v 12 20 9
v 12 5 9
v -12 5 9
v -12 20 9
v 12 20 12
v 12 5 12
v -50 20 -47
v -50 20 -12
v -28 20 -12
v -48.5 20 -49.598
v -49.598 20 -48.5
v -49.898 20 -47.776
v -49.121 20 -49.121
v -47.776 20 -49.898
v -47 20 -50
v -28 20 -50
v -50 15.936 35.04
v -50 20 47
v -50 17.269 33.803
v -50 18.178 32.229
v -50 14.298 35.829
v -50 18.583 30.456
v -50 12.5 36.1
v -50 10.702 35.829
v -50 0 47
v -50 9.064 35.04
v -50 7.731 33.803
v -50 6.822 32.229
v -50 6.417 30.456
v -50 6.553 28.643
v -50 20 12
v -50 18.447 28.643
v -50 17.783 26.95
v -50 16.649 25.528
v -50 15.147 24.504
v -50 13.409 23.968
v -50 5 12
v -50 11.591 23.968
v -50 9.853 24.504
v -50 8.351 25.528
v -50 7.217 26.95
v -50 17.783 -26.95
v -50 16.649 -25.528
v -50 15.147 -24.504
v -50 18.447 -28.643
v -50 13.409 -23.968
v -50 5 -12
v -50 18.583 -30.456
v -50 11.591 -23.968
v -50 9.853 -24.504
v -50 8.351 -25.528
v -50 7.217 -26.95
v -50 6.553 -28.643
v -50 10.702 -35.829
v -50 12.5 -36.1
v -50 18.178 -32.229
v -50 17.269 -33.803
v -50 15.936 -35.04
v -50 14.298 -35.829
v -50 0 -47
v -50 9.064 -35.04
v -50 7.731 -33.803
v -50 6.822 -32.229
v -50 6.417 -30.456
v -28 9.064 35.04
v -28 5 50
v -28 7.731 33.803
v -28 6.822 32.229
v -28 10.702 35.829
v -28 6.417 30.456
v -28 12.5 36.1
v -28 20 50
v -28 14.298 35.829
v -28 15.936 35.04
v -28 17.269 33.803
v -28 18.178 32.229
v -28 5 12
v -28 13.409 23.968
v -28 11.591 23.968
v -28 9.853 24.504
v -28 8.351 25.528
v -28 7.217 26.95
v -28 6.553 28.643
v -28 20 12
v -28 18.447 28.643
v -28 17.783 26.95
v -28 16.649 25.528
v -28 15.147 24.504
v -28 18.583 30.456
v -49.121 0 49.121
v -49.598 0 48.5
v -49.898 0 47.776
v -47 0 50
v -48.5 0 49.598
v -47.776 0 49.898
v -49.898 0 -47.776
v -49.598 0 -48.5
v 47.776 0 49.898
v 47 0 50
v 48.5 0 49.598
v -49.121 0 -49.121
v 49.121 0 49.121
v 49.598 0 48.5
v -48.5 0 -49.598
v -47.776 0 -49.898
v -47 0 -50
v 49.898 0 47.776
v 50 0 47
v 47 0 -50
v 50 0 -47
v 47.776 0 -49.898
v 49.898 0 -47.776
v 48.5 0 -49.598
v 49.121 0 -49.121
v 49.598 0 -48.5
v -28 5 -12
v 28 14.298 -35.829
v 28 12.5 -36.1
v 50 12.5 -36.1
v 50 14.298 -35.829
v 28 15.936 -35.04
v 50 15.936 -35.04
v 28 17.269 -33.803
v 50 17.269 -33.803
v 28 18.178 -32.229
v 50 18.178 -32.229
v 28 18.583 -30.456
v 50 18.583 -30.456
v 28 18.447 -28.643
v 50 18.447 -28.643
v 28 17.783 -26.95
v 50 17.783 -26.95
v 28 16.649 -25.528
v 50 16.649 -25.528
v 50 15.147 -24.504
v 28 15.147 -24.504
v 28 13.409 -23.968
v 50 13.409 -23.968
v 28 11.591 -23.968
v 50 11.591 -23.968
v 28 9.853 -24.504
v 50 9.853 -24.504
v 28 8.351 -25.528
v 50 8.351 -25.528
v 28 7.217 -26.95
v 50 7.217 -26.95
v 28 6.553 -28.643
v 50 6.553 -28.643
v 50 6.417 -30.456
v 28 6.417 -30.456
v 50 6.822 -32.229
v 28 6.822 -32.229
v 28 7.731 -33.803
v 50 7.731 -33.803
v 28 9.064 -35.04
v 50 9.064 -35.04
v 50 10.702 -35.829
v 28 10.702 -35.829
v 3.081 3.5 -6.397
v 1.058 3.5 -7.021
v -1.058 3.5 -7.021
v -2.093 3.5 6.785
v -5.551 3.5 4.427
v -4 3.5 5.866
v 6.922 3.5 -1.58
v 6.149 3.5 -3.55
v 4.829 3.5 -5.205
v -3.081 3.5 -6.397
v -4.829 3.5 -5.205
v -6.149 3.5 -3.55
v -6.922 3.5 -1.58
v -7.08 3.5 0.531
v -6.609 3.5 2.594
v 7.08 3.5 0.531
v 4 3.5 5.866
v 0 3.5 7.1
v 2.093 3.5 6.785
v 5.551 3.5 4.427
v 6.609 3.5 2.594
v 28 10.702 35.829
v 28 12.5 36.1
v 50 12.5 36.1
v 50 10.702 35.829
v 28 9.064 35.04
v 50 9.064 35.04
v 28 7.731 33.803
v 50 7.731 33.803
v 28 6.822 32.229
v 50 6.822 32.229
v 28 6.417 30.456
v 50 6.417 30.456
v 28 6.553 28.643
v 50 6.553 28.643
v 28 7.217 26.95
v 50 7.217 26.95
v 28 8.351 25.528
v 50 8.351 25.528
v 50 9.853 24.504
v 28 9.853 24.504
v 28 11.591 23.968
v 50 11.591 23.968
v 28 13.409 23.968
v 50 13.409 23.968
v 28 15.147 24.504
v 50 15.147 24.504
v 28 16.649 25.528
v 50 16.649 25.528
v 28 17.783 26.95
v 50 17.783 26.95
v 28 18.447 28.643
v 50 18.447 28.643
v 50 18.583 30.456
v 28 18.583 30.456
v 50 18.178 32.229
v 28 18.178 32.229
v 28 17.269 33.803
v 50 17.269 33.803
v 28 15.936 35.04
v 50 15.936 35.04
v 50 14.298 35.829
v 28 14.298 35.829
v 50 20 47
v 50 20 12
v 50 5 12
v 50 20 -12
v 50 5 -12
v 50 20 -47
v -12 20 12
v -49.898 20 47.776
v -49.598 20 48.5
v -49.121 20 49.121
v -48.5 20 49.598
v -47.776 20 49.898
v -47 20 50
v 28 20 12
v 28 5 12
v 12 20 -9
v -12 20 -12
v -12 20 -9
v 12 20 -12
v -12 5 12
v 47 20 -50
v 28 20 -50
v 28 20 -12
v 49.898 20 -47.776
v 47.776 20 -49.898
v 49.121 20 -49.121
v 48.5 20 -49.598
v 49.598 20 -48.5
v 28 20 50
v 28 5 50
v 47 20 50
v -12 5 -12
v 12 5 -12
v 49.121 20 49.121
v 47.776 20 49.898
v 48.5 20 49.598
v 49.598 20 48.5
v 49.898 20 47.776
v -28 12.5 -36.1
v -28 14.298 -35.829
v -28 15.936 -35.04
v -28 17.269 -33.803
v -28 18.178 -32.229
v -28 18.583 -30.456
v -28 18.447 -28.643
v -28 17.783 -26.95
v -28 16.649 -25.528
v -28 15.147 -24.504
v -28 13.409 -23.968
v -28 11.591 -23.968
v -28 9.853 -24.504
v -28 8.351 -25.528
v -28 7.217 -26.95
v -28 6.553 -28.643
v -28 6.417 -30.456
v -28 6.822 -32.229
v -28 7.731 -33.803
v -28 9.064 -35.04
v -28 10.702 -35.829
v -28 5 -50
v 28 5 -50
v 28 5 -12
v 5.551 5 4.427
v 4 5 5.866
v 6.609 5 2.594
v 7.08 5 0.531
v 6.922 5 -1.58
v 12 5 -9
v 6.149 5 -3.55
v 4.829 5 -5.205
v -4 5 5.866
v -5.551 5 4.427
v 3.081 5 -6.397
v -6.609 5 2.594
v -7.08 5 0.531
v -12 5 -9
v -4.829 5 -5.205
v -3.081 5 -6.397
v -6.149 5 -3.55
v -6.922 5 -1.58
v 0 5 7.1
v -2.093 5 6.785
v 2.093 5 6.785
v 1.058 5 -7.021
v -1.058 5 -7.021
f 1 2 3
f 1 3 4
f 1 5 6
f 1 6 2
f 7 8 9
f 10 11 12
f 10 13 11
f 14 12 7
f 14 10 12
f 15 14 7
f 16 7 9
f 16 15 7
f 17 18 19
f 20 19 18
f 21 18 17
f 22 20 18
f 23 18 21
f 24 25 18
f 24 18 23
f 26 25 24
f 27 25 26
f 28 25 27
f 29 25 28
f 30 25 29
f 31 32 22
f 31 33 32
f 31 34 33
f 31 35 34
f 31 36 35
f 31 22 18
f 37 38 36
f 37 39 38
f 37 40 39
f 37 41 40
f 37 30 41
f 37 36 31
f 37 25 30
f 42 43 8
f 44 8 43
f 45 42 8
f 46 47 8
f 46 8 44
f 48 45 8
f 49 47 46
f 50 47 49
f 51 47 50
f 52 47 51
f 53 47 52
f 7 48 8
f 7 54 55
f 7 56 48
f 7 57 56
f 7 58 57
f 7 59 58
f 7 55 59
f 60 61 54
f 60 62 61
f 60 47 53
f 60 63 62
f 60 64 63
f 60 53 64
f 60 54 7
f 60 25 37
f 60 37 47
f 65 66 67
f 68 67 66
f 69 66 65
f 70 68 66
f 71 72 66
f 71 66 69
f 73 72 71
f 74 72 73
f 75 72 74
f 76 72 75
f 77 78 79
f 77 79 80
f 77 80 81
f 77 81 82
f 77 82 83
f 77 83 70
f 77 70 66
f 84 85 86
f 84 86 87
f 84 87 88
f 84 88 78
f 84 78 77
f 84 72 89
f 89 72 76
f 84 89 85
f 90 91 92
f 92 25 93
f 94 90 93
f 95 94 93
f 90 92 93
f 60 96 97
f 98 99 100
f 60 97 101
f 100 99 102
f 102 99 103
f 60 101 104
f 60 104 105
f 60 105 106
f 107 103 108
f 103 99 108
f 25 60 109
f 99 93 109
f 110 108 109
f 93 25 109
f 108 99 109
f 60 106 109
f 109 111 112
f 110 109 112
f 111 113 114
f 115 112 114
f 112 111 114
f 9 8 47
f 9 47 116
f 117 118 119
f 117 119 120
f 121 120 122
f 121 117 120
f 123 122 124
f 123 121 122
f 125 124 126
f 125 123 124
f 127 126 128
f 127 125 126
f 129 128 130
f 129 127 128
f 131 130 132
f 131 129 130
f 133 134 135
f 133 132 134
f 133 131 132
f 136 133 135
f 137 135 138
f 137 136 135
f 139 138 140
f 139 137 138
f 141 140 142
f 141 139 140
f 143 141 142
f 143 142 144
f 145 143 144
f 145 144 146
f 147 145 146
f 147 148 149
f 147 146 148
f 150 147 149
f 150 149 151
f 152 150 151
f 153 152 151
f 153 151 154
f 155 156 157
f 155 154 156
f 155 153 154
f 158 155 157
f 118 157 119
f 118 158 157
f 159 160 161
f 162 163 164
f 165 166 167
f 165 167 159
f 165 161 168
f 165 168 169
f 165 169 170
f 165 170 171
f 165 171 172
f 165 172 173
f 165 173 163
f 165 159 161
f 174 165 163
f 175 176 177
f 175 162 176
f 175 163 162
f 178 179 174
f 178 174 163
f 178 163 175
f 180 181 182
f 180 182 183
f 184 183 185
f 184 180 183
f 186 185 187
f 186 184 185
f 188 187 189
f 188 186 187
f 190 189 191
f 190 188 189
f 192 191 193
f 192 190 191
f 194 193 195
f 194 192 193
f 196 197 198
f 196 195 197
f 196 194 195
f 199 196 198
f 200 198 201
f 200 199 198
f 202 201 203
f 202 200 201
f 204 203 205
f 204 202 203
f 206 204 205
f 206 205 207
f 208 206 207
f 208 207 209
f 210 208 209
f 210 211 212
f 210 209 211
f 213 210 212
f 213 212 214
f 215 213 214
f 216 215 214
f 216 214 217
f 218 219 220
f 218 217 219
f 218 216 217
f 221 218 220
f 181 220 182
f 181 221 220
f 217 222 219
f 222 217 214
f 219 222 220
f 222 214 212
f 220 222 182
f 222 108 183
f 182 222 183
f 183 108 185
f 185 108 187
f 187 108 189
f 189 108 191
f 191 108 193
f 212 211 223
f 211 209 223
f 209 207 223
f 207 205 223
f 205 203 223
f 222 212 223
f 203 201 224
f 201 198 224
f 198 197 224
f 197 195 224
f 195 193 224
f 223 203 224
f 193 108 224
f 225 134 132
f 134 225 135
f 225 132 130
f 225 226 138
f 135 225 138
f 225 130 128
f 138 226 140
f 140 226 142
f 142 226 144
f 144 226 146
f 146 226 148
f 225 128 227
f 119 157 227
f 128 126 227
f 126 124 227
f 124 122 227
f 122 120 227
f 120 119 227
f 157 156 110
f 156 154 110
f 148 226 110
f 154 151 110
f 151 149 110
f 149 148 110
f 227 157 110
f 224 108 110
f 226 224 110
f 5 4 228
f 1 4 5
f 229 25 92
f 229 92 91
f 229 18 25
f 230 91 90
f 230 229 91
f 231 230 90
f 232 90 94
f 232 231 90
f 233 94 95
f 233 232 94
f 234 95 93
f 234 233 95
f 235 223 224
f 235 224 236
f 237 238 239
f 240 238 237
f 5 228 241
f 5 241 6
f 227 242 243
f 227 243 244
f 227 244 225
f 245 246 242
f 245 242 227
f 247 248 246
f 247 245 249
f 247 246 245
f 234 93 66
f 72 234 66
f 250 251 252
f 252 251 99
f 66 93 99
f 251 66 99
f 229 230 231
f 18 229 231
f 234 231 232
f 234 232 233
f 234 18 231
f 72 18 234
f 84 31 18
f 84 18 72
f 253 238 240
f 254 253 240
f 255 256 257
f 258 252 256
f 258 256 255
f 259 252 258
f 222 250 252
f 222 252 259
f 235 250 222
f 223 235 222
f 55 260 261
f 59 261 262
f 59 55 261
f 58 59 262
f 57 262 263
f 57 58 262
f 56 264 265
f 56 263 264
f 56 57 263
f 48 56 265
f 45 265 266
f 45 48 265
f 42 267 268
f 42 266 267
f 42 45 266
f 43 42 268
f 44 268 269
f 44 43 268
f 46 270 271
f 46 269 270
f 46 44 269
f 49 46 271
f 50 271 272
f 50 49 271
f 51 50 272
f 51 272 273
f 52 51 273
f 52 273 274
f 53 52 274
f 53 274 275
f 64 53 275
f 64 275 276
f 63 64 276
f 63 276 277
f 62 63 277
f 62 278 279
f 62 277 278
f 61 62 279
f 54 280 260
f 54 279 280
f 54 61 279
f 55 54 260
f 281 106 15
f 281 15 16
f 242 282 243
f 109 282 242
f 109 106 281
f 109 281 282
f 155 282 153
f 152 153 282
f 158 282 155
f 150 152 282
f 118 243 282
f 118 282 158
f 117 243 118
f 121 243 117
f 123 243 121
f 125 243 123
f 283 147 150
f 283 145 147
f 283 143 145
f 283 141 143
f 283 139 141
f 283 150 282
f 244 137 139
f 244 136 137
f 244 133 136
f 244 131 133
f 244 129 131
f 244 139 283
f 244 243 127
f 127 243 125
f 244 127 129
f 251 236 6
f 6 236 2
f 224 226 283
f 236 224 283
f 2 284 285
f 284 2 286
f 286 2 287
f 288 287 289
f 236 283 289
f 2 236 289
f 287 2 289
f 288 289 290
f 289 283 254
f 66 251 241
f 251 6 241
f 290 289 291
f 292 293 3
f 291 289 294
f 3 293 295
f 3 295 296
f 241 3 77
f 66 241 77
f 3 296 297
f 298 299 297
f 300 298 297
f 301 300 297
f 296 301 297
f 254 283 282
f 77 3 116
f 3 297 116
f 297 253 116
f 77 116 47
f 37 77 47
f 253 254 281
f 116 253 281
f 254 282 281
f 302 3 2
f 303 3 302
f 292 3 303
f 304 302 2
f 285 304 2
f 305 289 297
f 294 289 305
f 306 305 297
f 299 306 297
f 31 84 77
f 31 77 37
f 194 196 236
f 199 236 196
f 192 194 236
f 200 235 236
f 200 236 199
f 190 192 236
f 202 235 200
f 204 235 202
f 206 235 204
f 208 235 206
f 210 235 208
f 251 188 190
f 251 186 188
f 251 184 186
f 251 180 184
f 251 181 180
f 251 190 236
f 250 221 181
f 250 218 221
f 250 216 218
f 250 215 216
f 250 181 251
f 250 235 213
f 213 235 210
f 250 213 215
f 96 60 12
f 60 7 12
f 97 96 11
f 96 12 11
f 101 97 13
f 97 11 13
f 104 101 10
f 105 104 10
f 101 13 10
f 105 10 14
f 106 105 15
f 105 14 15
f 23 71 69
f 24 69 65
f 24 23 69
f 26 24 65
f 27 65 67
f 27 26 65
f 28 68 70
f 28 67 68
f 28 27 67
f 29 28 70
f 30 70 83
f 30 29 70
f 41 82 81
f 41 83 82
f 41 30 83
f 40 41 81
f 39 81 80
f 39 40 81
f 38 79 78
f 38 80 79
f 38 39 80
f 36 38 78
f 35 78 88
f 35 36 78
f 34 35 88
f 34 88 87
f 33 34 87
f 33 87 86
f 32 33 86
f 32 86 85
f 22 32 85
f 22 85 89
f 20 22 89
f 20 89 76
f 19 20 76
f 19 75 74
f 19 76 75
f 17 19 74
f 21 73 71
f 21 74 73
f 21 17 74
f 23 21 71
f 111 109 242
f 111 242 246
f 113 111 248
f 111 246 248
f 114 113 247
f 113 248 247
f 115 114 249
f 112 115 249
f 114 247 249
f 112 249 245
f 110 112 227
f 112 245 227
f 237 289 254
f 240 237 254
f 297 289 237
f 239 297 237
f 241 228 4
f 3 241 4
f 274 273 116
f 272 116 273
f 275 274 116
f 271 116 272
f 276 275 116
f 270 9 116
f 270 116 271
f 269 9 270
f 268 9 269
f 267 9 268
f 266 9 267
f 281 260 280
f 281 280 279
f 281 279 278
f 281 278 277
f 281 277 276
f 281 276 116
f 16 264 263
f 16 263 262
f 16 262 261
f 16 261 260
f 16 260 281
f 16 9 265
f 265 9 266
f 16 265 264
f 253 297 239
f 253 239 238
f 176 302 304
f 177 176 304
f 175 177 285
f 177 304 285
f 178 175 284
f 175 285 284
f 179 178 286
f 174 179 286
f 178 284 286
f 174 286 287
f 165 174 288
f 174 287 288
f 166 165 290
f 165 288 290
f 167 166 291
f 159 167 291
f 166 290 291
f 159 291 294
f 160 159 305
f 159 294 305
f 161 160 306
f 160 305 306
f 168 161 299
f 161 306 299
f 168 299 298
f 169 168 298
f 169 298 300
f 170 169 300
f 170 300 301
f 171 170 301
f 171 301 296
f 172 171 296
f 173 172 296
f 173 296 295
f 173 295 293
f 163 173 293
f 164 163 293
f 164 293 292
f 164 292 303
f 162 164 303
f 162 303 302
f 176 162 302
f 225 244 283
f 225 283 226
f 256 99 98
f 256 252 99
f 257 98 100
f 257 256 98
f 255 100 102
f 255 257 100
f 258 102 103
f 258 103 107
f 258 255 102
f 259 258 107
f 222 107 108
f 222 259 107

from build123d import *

# Parameters (mm, degrees)
SKETCH1_W               = 100
SKETCH1_H               = 100
BOSS_EXTRUDE1_DEPTH     = 20
SKETCH3_R               = 7.1
CUT_EXTRUDE1_DEPTH      = 16.5
CUT_EXTRUDE4_DEPTH      = 74.484692283
CUT_EXTRUDE4_DEPTH_BACK = 74.484692283
SKETCH7_R               = 6.1
FILLET1_R               = 3
SKETCH11_W              = 24
SKETCH11_H              = 24
CUT_EXTRUDE6_DEPTH      = 15
SKETCH12_W              = 18
SKETCH12_H              = 15
CUT_EXTRUDE7_DEPTH      = 32


with BuildPart() as part:
    # Sketch1 → Boss-Extrude1 (new body)
    with BuildSketch(Plane(origin=(0, 0, 0), x_dir=(1, 0, 0), z_dir=(0, 1, 0))):
        Rectangle(SKETCH1_W, SKETCH1_H)
    extrude(amount=BOSS_EXTRUDE1_DEPTH)

    # Sketch3 → Cut-Extrude1 (cut)
    with BuildSketch(Plane(origin=(0, 20, 0), x_dir=(1, 0, 0), z_dir=(0, 1, 0))):
        with Locations(Location((0, 0, 0), (0, 0, 270))):
            Circle(SKETCH3_R)
    extrude(amount=-CUT_EXTRUDE1_DEPTH, mode=Mode.SUBTRACT)

    # Sketch7 → Cut-Extrude4 (cut, two sides: drawn at the far end of the back side and taken through both)
    with BuildSketch(Plane(origin=(0, 0, 0), x_dir=(0, 0, -1), z_dir=(1, 0, 0)).offset(-CUT_EXTRUDE4_DEPTH_BACK)):
        with Locations((30, 12.5)):
            Circle(SKETCH7_R)
        with Locations(Location((-30, 12.5, 0), (0, 0, 180))):
            Circle(SKETCH7_R)
    extrude(amount=CUT_EXTRUDE4_DEPTH + CUT_EXTRUDE4_DEPTH_BACK, mode=Mode.SUBTRACT)

    # Fillet1
    fillet1_edges = [part.edges().sort_by_distance(p)[0] for p in [
        (50, 10, 50),
        (-50, 10, 50),
        (-50, 10, -50),
        (50, 10, -50),
    ]]
    fillet(fillet1_edges, radius=FILLET1_R)

    # Sketch11 → Cut-Extrude6 (cut)
    with BuildSketch(Plane(origin=(0, 20, 0), x_dir=(1, 0, 0), z_dir=(0, 1, 0))):
        Polygon((-50, 12), (-28, 12), (-28, 50), (28, 50), (28, 12), (50, 12), (50, -12), (28, -12), (28, -50), (-28, -50), (-28, -12), (-50, -12), align=None)
        Rectangle(SKETCH11_W, SKETCH11_H, mode=Mode.SUBTRACT)
    extrude(amount=-CUT_EXTRUDE6_DEPTH, mode=Mode.SUBTRACT)

    # Sketch12 → Cut-Extrude7 (cut)
    with BuildSketch(Plane(origin=(12, 0, 0), x_dir=(0, 0, -1), z_dir=(1, 0, 0))):
        with Locations((0, 12.5)):
            Rectangle(SKETCH12_W, SKETCH12_H)
    extrude(amount=-CUT_EXTRUDE7_DEPTH, mode=Mode.SUBTRACT)


solid = part.part
